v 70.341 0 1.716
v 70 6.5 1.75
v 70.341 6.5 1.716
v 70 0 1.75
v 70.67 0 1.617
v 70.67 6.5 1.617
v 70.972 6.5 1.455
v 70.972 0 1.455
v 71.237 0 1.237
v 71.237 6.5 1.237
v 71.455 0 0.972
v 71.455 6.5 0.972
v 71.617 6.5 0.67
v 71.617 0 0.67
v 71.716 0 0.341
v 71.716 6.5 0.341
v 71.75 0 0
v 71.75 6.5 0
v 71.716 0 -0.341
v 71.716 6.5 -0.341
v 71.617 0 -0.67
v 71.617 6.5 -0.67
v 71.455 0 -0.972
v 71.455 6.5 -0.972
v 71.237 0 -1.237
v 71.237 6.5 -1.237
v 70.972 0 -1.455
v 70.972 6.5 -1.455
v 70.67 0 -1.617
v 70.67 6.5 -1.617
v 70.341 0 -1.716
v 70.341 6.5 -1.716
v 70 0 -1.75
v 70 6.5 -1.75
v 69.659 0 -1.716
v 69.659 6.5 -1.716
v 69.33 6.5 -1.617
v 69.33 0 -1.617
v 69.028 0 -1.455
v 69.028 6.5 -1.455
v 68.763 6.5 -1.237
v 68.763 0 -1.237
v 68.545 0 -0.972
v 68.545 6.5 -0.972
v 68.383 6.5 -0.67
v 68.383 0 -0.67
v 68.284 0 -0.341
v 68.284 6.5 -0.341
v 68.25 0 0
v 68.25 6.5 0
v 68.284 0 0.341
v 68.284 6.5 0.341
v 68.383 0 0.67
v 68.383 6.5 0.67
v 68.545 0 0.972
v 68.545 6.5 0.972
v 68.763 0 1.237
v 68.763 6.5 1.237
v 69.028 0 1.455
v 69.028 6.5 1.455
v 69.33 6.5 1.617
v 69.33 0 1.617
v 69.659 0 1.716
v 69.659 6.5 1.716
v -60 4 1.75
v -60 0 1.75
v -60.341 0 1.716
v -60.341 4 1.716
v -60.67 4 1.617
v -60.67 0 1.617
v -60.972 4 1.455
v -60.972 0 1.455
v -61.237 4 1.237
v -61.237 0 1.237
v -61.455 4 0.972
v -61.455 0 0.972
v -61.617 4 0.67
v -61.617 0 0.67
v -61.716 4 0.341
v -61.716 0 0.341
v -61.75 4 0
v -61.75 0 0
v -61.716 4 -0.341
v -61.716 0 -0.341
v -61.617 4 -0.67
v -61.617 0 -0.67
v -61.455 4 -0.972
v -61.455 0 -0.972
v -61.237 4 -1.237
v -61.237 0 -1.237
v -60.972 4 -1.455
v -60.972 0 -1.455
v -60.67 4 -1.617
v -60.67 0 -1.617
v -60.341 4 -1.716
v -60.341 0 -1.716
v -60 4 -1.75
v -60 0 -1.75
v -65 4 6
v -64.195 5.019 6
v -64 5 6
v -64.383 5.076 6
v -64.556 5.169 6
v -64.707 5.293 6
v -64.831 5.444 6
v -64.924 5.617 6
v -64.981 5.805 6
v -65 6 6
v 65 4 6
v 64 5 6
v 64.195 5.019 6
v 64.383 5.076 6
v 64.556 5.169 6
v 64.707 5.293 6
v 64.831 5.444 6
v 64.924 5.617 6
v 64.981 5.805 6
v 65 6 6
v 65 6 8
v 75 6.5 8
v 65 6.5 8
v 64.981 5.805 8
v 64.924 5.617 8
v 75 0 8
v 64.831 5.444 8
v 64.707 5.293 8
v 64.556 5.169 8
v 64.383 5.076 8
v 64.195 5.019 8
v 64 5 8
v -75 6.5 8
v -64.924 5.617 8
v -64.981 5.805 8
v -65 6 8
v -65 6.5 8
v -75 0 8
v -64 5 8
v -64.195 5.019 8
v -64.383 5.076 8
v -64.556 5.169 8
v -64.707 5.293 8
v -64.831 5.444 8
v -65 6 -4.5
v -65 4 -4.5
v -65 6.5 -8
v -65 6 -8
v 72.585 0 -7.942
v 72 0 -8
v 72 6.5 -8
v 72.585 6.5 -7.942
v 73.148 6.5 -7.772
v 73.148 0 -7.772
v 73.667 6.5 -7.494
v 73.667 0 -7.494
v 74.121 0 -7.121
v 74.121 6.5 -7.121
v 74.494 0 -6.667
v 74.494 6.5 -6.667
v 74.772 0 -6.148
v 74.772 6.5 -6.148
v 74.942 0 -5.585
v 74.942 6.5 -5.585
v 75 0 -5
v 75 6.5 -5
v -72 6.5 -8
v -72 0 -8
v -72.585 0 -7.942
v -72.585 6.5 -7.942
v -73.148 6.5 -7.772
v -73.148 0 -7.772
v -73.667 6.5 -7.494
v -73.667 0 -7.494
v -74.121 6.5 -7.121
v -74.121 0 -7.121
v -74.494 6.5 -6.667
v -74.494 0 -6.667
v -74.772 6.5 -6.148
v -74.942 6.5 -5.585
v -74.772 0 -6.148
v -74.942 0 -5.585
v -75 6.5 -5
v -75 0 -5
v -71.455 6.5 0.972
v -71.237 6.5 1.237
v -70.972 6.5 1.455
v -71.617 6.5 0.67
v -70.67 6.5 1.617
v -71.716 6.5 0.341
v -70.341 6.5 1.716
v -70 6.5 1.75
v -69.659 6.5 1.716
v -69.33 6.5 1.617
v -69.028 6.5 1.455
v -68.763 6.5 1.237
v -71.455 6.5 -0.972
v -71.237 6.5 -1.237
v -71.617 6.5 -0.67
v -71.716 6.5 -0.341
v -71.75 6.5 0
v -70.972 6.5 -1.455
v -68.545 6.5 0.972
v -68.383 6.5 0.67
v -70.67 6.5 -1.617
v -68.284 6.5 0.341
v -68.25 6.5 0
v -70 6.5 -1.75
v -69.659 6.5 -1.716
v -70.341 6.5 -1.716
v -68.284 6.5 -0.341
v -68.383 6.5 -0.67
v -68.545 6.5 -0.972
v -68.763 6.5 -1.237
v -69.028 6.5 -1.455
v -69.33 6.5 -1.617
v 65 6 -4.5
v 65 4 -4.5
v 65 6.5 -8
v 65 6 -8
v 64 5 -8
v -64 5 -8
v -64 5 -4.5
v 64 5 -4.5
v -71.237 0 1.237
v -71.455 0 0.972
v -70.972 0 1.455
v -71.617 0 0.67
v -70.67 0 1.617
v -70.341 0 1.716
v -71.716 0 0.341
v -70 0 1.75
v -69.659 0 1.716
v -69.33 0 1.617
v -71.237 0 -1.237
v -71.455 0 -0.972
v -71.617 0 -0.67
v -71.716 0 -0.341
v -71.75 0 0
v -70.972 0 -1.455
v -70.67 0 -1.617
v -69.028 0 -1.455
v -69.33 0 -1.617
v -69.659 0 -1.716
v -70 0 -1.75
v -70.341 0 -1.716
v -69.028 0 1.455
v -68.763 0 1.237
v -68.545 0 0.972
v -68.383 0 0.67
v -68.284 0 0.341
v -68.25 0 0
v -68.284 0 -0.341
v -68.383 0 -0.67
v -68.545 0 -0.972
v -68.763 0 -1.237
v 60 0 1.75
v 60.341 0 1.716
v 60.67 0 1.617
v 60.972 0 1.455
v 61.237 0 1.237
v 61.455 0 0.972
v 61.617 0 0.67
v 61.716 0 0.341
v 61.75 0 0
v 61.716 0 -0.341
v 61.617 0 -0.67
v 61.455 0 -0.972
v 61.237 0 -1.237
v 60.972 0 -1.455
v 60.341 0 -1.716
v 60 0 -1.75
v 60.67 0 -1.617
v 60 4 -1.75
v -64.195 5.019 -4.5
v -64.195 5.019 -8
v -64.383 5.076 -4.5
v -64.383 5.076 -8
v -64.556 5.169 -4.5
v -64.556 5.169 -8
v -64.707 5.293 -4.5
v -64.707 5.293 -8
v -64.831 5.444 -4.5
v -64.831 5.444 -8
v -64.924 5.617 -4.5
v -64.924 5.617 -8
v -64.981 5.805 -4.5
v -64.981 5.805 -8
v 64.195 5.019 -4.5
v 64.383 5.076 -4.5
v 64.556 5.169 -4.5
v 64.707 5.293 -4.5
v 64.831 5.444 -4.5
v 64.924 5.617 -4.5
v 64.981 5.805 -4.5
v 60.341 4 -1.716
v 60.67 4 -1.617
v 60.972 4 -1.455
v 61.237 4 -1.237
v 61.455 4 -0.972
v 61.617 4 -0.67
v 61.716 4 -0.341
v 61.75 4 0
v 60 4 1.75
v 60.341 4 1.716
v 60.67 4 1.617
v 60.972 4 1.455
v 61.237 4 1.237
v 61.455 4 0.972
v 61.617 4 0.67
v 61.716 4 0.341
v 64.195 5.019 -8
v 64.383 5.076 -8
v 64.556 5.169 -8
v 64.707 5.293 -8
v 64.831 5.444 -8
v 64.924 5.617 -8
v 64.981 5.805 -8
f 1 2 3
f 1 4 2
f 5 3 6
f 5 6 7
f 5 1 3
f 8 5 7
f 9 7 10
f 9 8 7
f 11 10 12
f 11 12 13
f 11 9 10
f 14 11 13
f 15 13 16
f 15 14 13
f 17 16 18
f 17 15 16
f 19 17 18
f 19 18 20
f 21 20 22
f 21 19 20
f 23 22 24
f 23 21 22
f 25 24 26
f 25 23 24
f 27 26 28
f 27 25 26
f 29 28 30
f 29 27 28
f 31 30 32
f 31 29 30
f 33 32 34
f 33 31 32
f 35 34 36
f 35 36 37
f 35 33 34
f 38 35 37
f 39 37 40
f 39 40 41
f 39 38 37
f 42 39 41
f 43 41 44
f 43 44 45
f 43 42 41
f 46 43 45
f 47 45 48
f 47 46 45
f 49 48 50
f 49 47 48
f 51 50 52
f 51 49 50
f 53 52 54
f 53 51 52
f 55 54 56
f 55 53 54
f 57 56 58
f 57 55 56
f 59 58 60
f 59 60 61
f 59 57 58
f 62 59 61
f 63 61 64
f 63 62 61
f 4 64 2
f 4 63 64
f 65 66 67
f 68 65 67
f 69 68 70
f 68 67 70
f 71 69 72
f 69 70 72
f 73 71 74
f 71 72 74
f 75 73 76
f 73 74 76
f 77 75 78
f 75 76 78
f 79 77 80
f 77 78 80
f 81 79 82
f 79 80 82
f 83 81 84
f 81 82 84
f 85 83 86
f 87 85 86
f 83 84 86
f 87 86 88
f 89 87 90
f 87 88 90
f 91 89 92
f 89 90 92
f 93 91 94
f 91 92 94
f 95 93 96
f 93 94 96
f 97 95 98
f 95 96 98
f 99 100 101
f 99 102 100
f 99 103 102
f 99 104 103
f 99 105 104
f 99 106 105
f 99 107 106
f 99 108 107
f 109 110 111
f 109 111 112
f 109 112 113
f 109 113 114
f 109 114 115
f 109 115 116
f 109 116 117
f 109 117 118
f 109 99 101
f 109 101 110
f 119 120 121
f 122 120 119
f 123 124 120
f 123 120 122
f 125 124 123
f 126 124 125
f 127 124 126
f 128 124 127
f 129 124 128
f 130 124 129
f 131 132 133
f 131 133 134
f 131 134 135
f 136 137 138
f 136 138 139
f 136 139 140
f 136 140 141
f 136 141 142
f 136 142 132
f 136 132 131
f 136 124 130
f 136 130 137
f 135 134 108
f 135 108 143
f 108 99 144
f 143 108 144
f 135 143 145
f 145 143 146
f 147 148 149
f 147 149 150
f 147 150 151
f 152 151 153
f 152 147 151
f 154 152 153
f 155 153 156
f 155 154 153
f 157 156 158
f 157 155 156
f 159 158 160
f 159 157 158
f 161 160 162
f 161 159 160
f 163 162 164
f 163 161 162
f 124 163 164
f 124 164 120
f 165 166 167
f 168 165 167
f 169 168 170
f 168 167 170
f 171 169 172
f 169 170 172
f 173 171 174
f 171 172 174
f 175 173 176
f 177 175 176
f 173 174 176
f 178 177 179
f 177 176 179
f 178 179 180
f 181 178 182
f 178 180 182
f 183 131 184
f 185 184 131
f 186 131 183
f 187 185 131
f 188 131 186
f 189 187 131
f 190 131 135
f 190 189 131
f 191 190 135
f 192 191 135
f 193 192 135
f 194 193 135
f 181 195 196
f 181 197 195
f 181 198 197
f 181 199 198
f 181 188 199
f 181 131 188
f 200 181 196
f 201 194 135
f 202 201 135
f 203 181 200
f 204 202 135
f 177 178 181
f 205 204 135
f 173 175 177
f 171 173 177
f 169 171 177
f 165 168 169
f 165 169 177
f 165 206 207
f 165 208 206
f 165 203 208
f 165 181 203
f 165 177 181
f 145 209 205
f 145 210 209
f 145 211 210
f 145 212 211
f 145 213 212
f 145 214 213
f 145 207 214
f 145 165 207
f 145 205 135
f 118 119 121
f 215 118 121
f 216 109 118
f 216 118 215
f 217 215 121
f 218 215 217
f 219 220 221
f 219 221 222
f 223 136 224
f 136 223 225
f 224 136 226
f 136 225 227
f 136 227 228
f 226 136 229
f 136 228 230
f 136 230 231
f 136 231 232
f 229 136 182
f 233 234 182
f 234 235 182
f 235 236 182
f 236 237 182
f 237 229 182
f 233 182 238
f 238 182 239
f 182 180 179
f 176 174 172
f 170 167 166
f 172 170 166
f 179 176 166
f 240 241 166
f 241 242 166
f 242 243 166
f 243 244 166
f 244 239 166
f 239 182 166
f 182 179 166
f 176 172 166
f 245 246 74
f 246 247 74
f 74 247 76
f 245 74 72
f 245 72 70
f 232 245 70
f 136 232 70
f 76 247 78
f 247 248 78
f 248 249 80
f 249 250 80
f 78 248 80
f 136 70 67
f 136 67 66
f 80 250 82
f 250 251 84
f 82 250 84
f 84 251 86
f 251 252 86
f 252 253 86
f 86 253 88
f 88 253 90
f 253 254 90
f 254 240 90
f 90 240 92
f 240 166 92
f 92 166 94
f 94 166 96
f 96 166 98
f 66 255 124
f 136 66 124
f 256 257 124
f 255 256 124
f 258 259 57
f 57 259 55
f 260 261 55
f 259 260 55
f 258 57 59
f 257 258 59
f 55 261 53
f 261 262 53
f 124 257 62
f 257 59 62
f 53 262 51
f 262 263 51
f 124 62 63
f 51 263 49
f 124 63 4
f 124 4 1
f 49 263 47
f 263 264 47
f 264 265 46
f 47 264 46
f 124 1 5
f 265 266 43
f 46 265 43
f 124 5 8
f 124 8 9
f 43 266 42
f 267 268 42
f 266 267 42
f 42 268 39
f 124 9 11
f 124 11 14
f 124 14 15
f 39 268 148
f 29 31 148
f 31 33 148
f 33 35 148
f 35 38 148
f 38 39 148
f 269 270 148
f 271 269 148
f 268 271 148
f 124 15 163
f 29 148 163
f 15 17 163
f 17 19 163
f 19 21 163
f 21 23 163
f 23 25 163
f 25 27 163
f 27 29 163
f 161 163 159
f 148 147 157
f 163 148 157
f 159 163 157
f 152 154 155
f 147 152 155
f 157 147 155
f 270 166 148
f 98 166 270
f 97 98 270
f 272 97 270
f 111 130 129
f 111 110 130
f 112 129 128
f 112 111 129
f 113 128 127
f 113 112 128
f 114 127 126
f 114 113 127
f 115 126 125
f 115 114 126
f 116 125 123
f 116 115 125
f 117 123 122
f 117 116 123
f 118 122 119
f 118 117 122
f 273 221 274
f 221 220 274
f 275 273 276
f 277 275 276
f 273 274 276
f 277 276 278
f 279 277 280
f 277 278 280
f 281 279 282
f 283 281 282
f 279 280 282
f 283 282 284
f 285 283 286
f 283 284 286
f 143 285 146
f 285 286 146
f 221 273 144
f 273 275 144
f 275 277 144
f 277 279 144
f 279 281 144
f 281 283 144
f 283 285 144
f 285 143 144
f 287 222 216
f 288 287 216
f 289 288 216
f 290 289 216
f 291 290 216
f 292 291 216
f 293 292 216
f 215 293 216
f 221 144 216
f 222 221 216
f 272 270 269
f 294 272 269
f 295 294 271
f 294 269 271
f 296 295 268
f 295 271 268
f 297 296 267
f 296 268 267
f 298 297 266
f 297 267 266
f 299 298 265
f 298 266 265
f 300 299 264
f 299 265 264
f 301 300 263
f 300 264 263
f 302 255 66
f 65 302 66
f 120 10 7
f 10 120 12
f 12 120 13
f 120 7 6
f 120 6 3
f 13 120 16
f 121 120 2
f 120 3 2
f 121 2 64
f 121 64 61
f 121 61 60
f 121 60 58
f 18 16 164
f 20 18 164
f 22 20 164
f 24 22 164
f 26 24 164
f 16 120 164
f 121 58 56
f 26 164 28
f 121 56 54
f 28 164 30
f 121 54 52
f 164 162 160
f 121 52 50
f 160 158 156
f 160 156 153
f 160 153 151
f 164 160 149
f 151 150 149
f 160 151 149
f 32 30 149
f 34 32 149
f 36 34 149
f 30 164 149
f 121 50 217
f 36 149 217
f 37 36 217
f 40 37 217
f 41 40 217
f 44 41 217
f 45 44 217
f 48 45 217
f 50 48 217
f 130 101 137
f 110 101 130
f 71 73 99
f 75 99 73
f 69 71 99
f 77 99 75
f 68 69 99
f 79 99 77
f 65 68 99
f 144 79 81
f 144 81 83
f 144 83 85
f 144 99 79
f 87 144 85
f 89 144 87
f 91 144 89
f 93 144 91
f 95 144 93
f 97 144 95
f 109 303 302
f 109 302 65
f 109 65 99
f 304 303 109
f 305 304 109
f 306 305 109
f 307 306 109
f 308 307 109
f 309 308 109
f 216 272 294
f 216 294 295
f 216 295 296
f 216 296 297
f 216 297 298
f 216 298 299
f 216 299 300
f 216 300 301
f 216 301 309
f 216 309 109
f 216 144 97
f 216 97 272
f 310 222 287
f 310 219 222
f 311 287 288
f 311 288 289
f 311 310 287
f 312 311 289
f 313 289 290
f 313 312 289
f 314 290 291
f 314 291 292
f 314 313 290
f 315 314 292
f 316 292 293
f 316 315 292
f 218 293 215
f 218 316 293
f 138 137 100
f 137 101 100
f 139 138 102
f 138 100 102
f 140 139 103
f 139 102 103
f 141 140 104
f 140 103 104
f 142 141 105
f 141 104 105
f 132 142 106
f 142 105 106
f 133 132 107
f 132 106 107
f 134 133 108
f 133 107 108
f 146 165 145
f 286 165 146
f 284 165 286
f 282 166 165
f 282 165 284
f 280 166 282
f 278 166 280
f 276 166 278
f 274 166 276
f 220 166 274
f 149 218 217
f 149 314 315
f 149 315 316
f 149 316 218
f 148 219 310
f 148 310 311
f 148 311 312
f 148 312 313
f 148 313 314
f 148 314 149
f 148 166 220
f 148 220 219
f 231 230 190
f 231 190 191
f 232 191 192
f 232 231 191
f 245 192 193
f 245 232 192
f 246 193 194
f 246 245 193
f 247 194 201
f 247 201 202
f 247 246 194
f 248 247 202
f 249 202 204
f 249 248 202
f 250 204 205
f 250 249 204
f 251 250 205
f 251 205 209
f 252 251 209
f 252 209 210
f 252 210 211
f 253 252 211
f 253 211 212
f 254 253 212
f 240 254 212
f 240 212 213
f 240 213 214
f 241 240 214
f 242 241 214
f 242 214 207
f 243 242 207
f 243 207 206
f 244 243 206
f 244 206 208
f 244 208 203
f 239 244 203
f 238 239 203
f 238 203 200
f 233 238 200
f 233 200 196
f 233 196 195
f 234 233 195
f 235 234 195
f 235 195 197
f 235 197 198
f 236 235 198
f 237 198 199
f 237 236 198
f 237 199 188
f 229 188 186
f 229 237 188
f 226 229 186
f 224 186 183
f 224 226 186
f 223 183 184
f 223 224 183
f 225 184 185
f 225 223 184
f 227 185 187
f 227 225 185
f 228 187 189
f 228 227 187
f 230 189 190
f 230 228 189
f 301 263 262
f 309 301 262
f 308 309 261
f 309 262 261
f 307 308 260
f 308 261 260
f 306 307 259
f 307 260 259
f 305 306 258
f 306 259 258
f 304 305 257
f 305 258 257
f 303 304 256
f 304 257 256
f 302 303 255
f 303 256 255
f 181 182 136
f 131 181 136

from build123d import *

# Parameters (mm, degrees)
SKETCH1_R           = 1.75
BOSS_EXTRUDE1_DEPTH = 4
SKETCH2_W           = 130
SKETCH2_H           = 10.5
SKETCH2_R           = 1.75
BOSS_EXTRUDE2_DEPTH = 1
SKETCH3_R           = 1.75
BOSS_EXTRUDE3_DEPTH = 1.5
FILLET1_R           = 1


with BuildPart() as part:
    # Sketch1 → Boss-Extrude1 (new body)
    with BuildSketch(Plane(origin=(0, 0, 0), x_dir=(1, 0, 0), z_dir=(0, 1, 0))):
        with BuildLine():
            Line((-75, -8), (75, -8))
            Line((75, -8), (75, 5))
            ThreePointArc((75, 5), (74.121320344, 7.121320344), (72, 8))
            Line((72, 8), (-72, 8))
            ThreePointArc((-72, 8), (-74.121320344, 7.121320344), (-75, 5))
            Line((-75, 5), (-75, -8))
        make_face()
        with Locations(Location((-70, 0, 0), (0, 0, 270))):
            Circle(SKETCH1_R, mode=Mode.SUBTRACT)
        with BuildLine():
            ThreePointArc((61.75, 0), (61.237436867, -1.237436867), (60, -1.75))
            Line((60, -1.75), (-60, -1.75))
            ThreePointArc((-60, -1.75), (-61.75, 0), (-60, 1.75))
            Line((-60, 1.75), (60, 1.75))
            ThreePointArc((60, 1.75), (61.237436867, 1.237436867), (61.75, 0))
        make_face(mode=Mode.SUBTRACT)
        with Locations(Location((70, 0, 0), (0, 0, 270))):
            Circle(SKETCH1_R, mode=Mode.SUBTRACT)
    extrude(amount=BOSS_EXTRUDE1_DEPTH)

    # Sketch2 → Boss-Extrude2 (add)
    with BuildSketch(Plane(origin=(0, 4, 0), x_dir=(1, 0, 0), z_dir=(0, 1, 0))):
        with BuildLine():
            Line((-75, -8), (75, -8))
            Line((75, -8), (75, 5))
            ThreePointArc((75, 5), (74.121320344, 7.121320344), (72, 8))
            Line((72, 8), (-72, 8))
            ThreePointArc((-72, 8), (-74.121320344, 7.121320344), (-75, 5))
            Line((-75, 5), (-75, -8))
        make_face()
        with Locations((0, -0.75)):
            Rectangle(SKETCH2_W, SKETCH2_H, mode=Mode.SUBTRACT)
        with Locations(Location((-70, 0, 0), (0, 0, 270))):
            Circle(SKETCH2_R, mode=Mode.SUBTRACT)
        with Locations(Location((70, 0, 0), (0, 0, 270))):
            Circle(SKETCH2_R, mode=Mode.SUBTRACT)
    extrude(amount=BOSS_EXTRUDE2_DEPTH)

    # Sketch3 → Boss-Extrude3 (add)
    # profile 1 of 2: a face of its own
    with BuildSketch(Plane(origin=(0, 5, 0), x_dir=(1, 0, 0), z_dir=(0, 1, 0))):
        with BuildLine():
            Line((65, 4.5), (65, 8))
            Line((65, 8), (72, 8))
            ThreePointArc((72, 8), (74.121320344, 7.121320344), (75, 5))
            Line((75, 5), (75, -8))
            Line((75, -8), (65, -8))
            Line((65, -8), (65, -6))
            Line((65, -6), (65, 4.5))
        make_face()
        with Locations(Location((70, 0, 0), (0, 0, 270))):
            Circle(SKETCH3_R, mode=Mode.SUBTRACT)
    # profile 2 of 2: a face of its own
    with BuildSketch(Plane(origin=(0, 5, 0), x_dir=(1, 0, 0), z_dir=(0, 1, 0))):
        with BuildLine():
            Line((-65, 4.5), (-65, 8))
            Line((-65, 8), (-72, 8))
            ThreePointArc((-72, 8), (-74.121320344, 7.121320344), (-75, 5))
            Line((-75, 5), (-75, -8))
            Line((-75, -8), (-65, -8))
            Line((-65, -8), (-65, -6))
            Line((-65, -6), (-65, 4.5))
        make_face()
        with Locations(Location((-70, 0, 0), (0, 0, 270))):
            Circle(SKETCH3_R, mode=Mode.SUBTRACT)
    extrude(amount=BOSS_EXTRUDE3_DEPTH)

    # Fillet1
    fillet1_edges = [part.edges().sort_by_distance(p)[0] for p in [
        (-65, 5, 7),
        (65, 5, 7),
        (65, 5, -6.25),
        (-65, 5, -6.25),
    ]]
    fillet(fillet1_edges, radius=FILLET1_R)


solid = part.part
